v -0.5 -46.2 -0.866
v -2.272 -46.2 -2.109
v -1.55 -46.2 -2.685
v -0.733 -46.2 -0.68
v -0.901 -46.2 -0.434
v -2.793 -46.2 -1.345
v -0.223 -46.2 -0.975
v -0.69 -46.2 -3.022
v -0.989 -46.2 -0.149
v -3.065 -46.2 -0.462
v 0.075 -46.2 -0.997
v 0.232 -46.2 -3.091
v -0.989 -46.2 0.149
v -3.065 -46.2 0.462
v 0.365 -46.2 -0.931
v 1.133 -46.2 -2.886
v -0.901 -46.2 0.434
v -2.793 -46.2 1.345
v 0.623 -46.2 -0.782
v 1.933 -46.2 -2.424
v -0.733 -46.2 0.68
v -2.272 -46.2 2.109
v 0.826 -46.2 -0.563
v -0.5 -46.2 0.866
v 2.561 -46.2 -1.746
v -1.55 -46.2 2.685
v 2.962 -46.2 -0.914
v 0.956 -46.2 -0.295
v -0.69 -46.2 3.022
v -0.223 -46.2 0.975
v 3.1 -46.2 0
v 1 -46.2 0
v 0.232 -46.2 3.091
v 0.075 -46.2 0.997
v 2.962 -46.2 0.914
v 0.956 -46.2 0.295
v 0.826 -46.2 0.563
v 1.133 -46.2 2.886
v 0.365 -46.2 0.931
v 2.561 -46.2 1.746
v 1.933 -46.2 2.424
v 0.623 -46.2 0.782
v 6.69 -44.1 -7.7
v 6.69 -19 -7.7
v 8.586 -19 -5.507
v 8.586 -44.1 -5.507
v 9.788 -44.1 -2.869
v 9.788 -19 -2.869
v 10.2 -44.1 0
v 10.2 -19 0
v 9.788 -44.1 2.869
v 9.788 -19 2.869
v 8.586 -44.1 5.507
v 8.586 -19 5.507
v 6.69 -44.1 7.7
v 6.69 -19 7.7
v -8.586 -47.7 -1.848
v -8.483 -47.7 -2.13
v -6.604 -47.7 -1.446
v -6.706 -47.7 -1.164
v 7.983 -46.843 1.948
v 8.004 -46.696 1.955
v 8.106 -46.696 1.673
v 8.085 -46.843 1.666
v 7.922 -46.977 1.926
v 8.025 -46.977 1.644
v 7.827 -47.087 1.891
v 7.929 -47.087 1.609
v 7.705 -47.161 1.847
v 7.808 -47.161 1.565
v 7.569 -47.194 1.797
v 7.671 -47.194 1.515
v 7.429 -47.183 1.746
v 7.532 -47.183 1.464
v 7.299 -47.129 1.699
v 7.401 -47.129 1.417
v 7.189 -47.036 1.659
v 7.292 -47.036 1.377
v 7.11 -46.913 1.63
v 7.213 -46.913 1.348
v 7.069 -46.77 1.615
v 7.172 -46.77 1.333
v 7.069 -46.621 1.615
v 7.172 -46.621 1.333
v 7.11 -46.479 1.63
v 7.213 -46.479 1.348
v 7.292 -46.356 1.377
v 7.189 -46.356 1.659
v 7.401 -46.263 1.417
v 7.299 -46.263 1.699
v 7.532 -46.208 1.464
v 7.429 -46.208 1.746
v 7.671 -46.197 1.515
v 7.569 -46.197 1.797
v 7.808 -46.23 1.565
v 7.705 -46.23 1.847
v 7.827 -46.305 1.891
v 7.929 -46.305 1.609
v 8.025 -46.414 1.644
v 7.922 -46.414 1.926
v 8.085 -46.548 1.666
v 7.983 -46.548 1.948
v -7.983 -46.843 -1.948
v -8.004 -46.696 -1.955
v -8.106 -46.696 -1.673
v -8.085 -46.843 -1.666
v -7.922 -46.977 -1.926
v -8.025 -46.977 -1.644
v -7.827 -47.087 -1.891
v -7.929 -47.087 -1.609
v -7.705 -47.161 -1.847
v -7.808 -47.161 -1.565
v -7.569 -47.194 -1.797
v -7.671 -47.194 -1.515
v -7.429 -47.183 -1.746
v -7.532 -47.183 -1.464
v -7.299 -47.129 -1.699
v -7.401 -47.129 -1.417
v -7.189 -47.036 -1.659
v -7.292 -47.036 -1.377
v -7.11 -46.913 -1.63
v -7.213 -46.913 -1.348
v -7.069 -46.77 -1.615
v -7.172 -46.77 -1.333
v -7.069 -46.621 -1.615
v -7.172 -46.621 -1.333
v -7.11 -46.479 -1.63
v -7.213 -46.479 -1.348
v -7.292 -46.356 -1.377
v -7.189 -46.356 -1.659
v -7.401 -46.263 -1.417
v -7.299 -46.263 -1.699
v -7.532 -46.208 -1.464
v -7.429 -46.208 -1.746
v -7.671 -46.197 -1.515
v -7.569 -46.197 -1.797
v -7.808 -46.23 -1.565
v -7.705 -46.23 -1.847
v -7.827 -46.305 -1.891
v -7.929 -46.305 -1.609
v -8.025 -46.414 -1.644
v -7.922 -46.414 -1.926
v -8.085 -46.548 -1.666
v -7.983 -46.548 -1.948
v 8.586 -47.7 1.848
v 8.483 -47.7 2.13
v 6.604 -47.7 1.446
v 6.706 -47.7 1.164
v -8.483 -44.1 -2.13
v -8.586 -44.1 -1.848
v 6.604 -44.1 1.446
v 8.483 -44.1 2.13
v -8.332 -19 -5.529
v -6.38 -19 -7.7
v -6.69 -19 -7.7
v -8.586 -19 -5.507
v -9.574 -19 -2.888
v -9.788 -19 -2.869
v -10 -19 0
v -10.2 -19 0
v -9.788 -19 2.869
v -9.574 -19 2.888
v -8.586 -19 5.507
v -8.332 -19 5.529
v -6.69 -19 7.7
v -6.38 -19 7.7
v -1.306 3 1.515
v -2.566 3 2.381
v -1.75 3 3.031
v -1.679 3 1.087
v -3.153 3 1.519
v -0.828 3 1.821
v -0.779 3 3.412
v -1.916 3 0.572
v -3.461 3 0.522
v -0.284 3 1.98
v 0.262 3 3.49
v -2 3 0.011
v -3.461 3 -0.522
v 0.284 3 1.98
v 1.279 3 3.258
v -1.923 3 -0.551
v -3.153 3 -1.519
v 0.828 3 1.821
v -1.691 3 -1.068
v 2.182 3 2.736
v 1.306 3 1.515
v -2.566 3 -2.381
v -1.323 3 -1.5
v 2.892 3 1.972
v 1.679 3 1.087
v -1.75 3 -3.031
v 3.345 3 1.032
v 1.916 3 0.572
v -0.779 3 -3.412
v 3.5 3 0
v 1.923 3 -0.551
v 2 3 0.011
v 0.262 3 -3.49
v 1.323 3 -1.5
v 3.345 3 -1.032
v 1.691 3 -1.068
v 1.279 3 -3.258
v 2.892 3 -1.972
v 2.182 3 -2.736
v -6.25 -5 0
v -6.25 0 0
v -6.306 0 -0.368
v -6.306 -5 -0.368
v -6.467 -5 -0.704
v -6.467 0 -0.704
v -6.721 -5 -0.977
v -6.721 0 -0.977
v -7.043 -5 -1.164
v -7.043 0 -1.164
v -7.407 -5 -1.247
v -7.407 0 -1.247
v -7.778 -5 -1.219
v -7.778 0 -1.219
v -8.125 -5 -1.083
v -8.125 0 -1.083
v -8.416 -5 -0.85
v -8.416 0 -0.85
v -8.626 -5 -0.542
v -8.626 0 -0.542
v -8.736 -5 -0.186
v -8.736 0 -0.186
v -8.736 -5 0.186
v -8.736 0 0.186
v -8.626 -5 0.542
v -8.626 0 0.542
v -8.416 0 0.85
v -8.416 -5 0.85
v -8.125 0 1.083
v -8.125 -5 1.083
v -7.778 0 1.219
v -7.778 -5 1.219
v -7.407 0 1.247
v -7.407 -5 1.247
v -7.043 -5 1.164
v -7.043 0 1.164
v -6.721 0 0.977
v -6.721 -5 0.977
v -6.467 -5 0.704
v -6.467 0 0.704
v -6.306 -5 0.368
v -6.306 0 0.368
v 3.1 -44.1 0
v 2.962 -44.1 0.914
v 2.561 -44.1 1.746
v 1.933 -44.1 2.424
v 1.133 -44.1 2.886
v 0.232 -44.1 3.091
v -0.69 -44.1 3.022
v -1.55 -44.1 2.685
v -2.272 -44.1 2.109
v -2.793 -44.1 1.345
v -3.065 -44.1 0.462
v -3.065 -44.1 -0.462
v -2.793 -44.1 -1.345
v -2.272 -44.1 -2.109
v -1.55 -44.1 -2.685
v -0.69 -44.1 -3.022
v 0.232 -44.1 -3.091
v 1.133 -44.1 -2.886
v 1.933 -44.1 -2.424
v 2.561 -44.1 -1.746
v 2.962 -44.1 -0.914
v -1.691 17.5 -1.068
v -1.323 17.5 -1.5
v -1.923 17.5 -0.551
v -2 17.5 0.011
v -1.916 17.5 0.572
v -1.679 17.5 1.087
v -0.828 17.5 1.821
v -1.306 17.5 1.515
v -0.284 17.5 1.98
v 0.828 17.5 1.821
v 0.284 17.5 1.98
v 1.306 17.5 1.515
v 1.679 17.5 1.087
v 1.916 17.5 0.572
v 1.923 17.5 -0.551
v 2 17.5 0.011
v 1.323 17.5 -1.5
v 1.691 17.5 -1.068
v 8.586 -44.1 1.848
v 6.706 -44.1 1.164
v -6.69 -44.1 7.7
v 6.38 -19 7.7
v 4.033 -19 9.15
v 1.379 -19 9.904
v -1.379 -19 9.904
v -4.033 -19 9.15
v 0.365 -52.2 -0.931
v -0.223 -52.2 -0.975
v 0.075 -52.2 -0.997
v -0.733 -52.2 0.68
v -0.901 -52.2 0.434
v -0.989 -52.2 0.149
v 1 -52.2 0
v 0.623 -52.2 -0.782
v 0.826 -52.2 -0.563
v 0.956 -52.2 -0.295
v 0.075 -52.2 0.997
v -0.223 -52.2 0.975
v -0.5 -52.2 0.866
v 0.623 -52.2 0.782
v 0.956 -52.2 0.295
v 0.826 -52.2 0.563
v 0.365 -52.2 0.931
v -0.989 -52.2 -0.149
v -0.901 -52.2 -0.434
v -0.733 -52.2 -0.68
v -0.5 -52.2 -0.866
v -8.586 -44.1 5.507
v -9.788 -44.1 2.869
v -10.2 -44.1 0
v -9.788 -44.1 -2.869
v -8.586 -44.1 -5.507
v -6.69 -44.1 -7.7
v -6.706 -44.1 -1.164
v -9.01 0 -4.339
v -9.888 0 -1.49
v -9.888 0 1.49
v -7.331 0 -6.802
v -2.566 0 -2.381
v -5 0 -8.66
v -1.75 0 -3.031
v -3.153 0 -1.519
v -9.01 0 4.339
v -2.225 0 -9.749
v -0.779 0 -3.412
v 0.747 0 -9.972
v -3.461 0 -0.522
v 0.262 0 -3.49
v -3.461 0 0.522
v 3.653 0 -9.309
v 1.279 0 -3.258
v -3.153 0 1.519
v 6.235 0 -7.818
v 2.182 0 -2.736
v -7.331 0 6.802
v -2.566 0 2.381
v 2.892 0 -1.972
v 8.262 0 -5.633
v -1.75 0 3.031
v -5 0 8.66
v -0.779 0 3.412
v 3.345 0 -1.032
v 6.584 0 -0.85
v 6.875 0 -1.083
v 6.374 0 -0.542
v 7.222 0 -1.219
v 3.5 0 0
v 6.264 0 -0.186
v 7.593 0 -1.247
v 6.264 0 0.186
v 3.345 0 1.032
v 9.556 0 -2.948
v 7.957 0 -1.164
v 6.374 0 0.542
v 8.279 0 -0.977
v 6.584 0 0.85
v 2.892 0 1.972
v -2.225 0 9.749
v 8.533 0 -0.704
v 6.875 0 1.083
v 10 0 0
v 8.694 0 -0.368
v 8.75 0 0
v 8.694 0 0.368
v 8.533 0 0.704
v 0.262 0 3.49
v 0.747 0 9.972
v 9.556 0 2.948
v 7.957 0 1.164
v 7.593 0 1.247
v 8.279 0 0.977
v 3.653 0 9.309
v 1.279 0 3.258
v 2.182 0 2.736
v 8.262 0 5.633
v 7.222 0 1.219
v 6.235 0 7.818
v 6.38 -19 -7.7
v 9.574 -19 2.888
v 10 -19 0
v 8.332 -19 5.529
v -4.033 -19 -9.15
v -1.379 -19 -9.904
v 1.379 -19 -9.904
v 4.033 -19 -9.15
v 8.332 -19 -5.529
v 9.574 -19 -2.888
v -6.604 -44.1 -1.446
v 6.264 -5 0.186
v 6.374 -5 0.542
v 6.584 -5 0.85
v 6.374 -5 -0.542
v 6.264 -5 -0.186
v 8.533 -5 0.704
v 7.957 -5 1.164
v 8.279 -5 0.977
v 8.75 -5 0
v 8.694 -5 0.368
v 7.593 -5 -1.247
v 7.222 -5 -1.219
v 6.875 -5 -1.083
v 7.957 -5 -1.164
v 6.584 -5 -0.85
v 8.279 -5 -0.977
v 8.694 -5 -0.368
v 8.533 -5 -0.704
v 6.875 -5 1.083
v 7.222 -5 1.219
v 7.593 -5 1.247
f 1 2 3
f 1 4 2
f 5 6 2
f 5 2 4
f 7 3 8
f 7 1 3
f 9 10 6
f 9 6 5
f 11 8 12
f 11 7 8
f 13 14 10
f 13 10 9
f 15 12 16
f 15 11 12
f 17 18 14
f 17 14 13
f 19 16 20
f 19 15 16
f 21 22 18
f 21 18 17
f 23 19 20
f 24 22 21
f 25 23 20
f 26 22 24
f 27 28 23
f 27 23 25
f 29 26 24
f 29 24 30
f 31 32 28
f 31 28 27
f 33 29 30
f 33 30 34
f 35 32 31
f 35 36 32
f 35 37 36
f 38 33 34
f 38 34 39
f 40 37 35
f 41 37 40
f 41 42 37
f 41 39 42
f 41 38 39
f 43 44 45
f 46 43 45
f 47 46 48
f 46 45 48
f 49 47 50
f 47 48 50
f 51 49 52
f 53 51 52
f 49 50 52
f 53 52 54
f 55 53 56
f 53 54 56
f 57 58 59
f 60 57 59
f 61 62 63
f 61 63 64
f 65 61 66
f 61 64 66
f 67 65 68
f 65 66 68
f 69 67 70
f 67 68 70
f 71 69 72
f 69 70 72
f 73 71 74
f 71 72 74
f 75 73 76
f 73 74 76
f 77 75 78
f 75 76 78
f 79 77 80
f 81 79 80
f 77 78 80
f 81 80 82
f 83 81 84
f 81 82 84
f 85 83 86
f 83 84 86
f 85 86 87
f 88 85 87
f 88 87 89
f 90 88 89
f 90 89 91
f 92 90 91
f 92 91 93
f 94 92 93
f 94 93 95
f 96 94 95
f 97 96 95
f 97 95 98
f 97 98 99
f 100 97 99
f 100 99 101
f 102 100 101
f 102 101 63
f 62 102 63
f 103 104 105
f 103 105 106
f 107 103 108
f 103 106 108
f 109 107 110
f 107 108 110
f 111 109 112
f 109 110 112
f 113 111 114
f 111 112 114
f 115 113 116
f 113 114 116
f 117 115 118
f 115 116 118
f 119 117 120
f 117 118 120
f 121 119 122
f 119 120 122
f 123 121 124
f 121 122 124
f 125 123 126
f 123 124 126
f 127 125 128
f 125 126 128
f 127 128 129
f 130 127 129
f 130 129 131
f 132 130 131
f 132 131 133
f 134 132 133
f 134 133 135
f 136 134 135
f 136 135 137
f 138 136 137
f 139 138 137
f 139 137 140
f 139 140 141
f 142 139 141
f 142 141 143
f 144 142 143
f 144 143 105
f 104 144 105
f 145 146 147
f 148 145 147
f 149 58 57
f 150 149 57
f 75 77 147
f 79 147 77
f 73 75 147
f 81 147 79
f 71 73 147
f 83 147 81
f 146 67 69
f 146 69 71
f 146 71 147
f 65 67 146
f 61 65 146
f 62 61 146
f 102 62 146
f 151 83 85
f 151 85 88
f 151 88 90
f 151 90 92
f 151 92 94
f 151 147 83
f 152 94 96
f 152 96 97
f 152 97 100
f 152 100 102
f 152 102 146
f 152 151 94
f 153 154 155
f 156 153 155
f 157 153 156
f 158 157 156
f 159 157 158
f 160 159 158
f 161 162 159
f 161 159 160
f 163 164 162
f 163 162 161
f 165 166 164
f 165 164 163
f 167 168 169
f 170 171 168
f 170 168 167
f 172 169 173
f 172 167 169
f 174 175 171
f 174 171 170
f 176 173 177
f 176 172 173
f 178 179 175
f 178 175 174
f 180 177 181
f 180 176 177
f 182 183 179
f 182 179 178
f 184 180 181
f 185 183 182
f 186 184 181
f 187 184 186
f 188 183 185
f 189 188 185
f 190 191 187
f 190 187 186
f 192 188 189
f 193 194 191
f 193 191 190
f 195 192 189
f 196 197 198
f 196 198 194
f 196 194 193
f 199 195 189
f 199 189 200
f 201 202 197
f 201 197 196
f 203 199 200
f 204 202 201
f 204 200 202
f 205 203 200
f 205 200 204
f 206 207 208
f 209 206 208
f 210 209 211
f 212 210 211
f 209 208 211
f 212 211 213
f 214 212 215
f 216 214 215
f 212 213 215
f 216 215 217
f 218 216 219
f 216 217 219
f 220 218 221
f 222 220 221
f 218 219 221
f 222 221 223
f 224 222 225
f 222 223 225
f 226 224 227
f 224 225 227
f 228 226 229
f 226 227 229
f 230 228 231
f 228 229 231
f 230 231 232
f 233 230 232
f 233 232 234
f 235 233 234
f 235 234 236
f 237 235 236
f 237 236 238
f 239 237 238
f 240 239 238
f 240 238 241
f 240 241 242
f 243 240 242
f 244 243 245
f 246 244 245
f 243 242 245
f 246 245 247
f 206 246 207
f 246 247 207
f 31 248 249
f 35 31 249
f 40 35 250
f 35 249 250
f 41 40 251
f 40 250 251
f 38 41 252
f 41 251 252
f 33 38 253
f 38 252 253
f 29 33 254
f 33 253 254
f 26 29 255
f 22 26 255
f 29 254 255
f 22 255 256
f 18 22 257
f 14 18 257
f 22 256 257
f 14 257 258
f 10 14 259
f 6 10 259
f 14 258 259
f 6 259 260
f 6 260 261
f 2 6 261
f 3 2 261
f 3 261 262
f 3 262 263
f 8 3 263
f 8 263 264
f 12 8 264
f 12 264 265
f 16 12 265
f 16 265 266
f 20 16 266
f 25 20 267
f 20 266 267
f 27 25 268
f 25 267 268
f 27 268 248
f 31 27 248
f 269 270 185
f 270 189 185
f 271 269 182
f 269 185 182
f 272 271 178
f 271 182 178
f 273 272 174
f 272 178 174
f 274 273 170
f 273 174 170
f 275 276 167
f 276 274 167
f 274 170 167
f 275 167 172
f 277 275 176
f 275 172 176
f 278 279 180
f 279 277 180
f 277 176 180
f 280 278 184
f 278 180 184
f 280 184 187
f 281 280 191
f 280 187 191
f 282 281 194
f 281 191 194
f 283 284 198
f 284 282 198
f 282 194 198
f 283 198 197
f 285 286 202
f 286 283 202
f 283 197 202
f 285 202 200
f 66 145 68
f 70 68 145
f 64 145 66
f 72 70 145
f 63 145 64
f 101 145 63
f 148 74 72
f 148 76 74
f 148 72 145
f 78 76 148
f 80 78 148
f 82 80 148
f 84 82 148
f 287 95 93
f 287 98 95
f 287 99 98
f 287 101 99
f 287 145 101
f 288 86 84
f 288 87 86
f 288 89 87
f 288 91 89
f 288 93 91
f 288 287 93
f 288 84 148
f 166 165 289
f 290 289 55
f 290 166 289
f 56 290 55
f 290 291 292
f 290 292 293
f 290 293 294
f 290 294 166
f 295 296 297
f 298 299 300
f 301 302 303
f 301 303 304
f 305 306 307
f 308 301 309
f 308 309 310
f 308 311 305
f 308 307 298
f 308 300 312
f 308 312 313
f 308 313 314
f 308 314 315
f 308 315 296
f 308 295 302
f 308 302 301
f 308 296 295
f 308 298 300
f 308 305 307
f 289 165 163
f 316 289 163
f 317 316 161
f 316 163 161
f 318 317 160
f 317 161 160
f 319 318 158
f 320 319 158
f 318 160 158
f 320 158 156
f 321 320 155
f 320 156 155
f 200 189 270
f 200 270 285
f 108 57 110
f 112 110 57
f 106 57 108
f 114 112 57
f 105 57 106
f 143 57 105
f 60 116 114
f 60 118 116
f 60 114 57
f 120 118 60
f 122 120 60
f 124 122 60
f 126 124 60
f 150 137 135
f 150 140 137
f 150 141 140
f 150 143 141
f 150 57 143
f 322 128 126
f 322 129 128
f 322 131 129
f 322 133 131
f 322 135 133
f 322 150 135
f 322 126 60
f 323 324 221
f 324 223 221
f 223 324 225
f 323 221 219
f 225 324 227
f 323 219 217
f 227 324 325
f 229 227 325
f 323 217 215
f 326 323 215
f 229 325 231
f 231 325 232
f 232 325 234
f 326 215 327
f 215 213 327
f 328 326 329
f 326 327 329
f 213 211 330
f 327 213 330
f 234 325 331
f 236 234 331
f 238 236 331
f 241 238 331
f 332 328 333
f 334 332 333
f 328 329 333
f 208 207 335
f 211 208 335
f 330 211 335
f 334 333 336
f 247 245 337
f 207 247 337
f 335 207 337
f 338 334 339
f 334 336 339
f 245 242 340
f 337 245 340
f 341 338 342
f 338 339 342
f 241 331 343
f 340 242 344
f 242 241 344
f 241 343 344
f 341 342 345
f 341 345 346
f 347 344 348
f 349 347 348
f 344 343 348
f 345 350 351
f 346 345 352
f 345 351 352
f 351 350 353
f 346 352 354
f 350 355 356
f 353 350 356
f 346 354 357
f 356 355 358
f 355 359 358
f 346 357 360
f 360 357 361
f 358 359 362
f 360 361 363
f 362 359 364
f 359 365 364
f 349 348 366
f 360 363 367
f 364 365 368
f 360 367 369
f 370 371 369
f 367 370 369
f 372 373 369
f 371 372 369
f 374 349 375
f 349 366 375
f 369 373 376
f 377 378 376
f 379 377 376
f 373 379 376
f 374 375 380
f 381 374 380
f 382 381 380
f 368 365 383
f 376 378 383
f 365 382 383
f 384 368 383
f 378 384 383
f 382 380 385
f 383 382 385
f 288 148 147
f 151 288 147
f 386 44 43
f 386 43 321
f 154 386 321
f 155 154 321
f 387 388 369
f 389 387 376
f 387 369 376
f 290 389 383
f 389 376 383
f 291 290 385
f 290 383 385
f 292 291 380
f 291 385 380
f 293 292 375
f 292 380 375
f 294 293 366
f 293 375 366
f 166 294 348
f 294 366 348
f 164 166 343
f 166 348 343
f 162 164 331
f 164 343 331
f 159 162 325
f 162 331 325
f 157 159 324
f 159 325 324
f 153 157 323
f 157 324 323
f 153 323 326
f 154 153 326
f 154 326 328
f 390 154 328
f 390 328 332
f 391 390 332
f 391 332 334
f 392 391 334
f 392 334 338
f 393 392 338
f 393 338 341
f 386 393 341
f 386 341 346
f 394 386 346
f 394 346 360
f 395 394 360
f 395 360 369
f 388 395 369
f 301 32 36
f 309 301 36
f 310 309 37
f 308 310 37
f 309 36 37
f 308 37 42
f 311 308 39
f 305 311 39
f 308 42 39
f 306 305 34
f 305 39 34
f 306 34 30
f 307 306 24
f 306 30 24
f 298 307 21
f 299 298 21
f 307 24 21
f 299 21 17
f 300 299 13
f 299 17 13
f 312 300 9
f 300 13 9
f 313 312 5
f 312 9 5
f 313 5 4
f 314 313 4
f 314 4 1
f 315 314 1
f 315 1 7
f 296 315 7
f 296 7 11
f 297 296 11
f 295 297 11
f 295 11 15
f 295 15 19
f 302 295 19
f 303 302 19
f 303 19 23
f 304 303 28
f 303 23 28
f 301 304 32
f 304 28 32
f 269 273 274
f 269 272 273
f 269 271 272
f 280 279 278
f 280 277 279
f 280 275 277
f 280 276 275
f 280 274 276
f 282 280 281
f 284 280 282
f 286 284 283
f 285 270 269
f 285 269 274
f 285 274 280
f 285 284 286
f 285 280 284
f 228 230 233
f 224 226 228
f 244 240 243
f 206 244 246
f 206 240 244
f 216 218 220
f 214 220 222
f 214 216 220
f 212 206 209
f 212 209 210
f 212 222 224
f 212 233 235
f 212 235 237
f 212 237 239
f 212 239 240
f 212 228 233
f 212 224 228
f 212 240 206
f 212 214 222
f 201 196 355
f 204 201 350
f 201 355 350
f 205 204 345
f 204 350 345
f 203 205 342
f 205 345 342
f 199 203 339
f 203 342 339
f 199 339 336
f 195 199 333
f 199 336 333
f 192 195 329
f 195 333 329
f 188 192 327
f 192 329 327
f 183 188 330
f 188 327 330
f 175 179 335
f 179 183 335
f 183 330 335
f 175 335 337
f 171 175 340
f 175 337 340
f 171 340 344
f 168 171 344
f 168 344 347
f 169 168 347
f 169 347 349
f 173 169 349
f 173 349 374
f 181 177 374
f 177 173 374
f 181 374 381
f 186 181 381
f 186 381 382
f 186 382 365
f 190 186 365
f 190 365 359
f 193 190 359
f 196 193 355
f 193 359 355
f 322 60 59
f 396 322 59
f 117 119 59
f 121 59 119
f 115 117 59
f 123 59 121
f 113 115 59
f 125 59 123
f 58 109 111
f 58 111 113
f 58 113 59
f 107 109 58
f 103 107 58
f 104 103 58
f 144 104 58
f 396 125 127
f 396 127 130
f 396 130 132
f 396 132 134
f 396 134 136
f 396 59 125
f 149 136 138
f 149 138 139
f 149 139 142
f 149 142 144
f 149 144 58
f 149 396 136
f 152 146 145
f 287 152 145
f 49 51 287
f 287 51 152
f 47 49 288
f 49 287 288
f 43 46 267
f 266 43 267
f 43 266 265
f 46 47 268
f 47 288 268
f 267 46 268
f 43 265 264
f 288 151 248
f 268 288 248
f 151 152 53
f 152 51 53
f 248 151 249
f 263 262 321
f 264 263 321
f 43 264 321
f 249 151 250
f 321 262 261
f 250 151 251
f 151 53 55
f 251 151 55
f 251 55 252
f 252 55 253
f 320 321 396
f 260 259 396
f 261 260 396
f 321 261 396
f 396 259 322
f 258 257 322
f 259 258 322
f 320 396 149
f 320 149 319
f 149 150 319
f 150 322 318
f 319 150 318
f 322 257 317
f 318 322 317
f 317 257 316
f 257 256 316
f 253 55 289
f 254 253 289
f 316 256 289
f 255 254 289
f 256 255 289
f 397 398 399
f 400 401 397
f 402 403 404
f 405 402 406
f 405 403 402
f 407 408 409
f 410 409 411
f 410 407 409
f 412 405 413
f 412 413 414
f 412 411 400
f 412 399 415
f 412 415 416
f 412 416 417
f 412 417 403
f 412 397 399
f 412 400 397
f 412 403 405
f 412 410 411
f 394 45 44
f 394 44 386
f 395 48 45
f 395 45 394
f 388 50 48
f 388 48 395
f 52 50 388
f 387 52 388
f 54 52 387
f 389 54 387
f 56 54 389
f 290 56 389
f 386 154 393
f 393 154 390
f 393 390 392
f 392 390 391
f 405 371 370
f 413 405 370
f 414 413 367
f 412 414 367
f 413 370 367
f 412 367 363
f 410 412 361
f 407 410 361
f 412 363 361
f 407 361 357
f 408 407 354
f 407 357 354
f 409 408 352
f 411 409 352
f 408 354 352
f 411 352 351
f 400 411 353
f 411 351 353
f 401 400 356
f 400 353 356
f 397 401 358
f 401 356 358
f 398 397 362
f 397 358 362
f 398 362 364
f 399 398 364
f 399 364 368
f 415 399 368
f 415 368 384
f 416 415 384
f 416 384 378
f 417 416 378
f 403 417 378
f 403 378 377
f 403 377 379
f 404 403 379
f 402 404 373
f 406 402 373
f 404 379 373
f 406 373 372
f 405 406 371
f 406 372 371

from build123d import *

# Parameters (mm, degrees)
SKETCH_R              = 10
PAD_DEPTH             = 19
SKETCH001_R           = 3.5
PAD001_DEPTH          = 3
SKETCH002_R           = 2
PAD002_DEPTH          = 14.5
SKETCH003_W           = 10
SKETCH003_H           = 5
POCKET_DEPTH          = 14.5
PAD003_DEPTH          = 25.1
SKETCH005_R           = 3.1
PAD004_DEPTH          = 2.1
SKETCH006_R           = 1
PAD005_DEPTH          = 6
PAD006_DEPTH          = 3.6
SKETCH009_R           = 0.5
POCKET001_DEPTH       = 5
POLARPATTERN_COUNT    = 2
POLARPATTERN001_COUNT = 2
SKETCH010_R           = 1.25
POCKET002_DEPTH       = 5


with BuildPart() as part:
    # Sketch → Pad (new body)
    with BuildSketch(Plane.XZ):
        Circle(SKETCH_R)
    extrude(amount=PAD_DEPTH)

    # Sketch001 (on Face2 of Pad) → Pad001 (join)
    with BuildSketch(Plane(origin=(0, 0, 0), x_dir=(1, 0, 0), z_dir=(0, 1, 0))):
        Circle(SKETCH001_R)
    extrude(amount=PAD001_DEPTH)

    # Sketch002 (on Face5 of Pad001) → Pad002 (join)
    with BuildSketch(Plane(origin=(0, 3, 0), x_dir=(1, 0, 0), z_dir=(0, 1, 0))):
        Circle(SKETCH002_R)
    extrude(amount=PAD002_DEPTH)

    # Sketch003 (on Face7 of Pad002) → Pocket (cut)
    with BuildSketch(Plane(origin=(0, 17.5, 0), x_dir=(1, 0, 0), z_dir=(0, 1, 0))):
        with Locations((0, 4)):
            Rectangle(SKETCH003_W, SKETCH003_H)
    extrude(amount=-POCKET_DEPTH, mode=Mode.SUBTRACT)

    # Sketch004 (on Face3 of Pocket) → Pad003 (join)
    with BuildSketch(Plane.XZ.offset(19)):
        with BuildLine():
            Line((-6.689544, 7.7), (6.689544, 7.7))
            ThreePointArc((6.689544, -7.7), (10.2, 0), (6.689544, 7.7))
            Line((6.689544, -7.7), (-6.689544, -7.7))
            ThreePointArc((-6.689544, 7.7), (-10.2, 0), (-6.689544, -7.7))
        make_face()
    extrude(amount=PAD003_DEPTH)

    # Sketch005 (on Face14 of Pad003) → Pad004 (join)
    with BuildSketch(Plane.XZ.offset(44.1)):
        Circle(SKETCH005_R)
    extrude(amount=PAD004_DEPTH)

    # Sketch006 (on Face21 of Pad004) → Pad005 (join)
    with BuildSketch(Plane.XZ.offset(46.2)):
        Circle(SKETCH006_R)
    extrude(amount=PAD005_DEPTH)

    # Sketch008 (on Face14 of Pad005) → Pad006 (join)
    with BuildSketch(Plane.XZ.offset(44.1)):
        Polygon((6.603759, 1.445812), (8.483144, 2.129852), (8.58575, 1.847944), (6.706365, 1.163904), align=None)
    pad006 = extrude(amount=PAD006_DEPTH)

    # Sketch009 (on Face21 of Pad006) → Pocket001 (cut)
    with BuildSketch(Plane(origin=(0.410424, 0, -1.127631), x_dir=(0.939693, 0, 0.34202), z_dir=(0.34202, 0, -0.939693))):
        with Locations((7.689708, 46.695641)):
            Circle(SKETCH009_R)
    pocket001 = extrude(amount=-POCKET001_DEPTH, mode=Mode.SUBTRACT)

    # PolarPattern: Pad006 ×2 about axis
    polarpattern_axis = Axis((0, -44.1, 0), (0, -1, 0))
    for i in range(1, POLARPATTERN_COUNT):
        add(pad006.rotate(polarpattern_axis, i * 360 / POLARPATTERN_COUNT))

    # PolarPattern001: Pocket001 ×2 about axis
    polarpattern001_axis = Axis((0, 0, 0), (0, 1, 0))
    for i in range(1, POLARPATTERN001_COUNT):
        add(pocket001.rotate(polarpattern001_axis, i * 360 / POLARPATTERN001_COUNT), mode=Mode.SUBTRACT)

    # Sketch010 (on Face2 of PolarPattern001) → Pocket002 (cut)
    with BuildSketch(Plane(origin=(0, 0, 0), x_dir=(1, 0, 0), z_dir=(0, 1, 0))):
        with Locations((7.5, 0)):
            Circle(SKETCH010_R)
        with Locations((-7.5, 0)):
            Circle(SKETCH010_R)
    extrude(amount=-POCKET002_DEPTH, mode=Mode.SUBTRACT)


solid = part.part
